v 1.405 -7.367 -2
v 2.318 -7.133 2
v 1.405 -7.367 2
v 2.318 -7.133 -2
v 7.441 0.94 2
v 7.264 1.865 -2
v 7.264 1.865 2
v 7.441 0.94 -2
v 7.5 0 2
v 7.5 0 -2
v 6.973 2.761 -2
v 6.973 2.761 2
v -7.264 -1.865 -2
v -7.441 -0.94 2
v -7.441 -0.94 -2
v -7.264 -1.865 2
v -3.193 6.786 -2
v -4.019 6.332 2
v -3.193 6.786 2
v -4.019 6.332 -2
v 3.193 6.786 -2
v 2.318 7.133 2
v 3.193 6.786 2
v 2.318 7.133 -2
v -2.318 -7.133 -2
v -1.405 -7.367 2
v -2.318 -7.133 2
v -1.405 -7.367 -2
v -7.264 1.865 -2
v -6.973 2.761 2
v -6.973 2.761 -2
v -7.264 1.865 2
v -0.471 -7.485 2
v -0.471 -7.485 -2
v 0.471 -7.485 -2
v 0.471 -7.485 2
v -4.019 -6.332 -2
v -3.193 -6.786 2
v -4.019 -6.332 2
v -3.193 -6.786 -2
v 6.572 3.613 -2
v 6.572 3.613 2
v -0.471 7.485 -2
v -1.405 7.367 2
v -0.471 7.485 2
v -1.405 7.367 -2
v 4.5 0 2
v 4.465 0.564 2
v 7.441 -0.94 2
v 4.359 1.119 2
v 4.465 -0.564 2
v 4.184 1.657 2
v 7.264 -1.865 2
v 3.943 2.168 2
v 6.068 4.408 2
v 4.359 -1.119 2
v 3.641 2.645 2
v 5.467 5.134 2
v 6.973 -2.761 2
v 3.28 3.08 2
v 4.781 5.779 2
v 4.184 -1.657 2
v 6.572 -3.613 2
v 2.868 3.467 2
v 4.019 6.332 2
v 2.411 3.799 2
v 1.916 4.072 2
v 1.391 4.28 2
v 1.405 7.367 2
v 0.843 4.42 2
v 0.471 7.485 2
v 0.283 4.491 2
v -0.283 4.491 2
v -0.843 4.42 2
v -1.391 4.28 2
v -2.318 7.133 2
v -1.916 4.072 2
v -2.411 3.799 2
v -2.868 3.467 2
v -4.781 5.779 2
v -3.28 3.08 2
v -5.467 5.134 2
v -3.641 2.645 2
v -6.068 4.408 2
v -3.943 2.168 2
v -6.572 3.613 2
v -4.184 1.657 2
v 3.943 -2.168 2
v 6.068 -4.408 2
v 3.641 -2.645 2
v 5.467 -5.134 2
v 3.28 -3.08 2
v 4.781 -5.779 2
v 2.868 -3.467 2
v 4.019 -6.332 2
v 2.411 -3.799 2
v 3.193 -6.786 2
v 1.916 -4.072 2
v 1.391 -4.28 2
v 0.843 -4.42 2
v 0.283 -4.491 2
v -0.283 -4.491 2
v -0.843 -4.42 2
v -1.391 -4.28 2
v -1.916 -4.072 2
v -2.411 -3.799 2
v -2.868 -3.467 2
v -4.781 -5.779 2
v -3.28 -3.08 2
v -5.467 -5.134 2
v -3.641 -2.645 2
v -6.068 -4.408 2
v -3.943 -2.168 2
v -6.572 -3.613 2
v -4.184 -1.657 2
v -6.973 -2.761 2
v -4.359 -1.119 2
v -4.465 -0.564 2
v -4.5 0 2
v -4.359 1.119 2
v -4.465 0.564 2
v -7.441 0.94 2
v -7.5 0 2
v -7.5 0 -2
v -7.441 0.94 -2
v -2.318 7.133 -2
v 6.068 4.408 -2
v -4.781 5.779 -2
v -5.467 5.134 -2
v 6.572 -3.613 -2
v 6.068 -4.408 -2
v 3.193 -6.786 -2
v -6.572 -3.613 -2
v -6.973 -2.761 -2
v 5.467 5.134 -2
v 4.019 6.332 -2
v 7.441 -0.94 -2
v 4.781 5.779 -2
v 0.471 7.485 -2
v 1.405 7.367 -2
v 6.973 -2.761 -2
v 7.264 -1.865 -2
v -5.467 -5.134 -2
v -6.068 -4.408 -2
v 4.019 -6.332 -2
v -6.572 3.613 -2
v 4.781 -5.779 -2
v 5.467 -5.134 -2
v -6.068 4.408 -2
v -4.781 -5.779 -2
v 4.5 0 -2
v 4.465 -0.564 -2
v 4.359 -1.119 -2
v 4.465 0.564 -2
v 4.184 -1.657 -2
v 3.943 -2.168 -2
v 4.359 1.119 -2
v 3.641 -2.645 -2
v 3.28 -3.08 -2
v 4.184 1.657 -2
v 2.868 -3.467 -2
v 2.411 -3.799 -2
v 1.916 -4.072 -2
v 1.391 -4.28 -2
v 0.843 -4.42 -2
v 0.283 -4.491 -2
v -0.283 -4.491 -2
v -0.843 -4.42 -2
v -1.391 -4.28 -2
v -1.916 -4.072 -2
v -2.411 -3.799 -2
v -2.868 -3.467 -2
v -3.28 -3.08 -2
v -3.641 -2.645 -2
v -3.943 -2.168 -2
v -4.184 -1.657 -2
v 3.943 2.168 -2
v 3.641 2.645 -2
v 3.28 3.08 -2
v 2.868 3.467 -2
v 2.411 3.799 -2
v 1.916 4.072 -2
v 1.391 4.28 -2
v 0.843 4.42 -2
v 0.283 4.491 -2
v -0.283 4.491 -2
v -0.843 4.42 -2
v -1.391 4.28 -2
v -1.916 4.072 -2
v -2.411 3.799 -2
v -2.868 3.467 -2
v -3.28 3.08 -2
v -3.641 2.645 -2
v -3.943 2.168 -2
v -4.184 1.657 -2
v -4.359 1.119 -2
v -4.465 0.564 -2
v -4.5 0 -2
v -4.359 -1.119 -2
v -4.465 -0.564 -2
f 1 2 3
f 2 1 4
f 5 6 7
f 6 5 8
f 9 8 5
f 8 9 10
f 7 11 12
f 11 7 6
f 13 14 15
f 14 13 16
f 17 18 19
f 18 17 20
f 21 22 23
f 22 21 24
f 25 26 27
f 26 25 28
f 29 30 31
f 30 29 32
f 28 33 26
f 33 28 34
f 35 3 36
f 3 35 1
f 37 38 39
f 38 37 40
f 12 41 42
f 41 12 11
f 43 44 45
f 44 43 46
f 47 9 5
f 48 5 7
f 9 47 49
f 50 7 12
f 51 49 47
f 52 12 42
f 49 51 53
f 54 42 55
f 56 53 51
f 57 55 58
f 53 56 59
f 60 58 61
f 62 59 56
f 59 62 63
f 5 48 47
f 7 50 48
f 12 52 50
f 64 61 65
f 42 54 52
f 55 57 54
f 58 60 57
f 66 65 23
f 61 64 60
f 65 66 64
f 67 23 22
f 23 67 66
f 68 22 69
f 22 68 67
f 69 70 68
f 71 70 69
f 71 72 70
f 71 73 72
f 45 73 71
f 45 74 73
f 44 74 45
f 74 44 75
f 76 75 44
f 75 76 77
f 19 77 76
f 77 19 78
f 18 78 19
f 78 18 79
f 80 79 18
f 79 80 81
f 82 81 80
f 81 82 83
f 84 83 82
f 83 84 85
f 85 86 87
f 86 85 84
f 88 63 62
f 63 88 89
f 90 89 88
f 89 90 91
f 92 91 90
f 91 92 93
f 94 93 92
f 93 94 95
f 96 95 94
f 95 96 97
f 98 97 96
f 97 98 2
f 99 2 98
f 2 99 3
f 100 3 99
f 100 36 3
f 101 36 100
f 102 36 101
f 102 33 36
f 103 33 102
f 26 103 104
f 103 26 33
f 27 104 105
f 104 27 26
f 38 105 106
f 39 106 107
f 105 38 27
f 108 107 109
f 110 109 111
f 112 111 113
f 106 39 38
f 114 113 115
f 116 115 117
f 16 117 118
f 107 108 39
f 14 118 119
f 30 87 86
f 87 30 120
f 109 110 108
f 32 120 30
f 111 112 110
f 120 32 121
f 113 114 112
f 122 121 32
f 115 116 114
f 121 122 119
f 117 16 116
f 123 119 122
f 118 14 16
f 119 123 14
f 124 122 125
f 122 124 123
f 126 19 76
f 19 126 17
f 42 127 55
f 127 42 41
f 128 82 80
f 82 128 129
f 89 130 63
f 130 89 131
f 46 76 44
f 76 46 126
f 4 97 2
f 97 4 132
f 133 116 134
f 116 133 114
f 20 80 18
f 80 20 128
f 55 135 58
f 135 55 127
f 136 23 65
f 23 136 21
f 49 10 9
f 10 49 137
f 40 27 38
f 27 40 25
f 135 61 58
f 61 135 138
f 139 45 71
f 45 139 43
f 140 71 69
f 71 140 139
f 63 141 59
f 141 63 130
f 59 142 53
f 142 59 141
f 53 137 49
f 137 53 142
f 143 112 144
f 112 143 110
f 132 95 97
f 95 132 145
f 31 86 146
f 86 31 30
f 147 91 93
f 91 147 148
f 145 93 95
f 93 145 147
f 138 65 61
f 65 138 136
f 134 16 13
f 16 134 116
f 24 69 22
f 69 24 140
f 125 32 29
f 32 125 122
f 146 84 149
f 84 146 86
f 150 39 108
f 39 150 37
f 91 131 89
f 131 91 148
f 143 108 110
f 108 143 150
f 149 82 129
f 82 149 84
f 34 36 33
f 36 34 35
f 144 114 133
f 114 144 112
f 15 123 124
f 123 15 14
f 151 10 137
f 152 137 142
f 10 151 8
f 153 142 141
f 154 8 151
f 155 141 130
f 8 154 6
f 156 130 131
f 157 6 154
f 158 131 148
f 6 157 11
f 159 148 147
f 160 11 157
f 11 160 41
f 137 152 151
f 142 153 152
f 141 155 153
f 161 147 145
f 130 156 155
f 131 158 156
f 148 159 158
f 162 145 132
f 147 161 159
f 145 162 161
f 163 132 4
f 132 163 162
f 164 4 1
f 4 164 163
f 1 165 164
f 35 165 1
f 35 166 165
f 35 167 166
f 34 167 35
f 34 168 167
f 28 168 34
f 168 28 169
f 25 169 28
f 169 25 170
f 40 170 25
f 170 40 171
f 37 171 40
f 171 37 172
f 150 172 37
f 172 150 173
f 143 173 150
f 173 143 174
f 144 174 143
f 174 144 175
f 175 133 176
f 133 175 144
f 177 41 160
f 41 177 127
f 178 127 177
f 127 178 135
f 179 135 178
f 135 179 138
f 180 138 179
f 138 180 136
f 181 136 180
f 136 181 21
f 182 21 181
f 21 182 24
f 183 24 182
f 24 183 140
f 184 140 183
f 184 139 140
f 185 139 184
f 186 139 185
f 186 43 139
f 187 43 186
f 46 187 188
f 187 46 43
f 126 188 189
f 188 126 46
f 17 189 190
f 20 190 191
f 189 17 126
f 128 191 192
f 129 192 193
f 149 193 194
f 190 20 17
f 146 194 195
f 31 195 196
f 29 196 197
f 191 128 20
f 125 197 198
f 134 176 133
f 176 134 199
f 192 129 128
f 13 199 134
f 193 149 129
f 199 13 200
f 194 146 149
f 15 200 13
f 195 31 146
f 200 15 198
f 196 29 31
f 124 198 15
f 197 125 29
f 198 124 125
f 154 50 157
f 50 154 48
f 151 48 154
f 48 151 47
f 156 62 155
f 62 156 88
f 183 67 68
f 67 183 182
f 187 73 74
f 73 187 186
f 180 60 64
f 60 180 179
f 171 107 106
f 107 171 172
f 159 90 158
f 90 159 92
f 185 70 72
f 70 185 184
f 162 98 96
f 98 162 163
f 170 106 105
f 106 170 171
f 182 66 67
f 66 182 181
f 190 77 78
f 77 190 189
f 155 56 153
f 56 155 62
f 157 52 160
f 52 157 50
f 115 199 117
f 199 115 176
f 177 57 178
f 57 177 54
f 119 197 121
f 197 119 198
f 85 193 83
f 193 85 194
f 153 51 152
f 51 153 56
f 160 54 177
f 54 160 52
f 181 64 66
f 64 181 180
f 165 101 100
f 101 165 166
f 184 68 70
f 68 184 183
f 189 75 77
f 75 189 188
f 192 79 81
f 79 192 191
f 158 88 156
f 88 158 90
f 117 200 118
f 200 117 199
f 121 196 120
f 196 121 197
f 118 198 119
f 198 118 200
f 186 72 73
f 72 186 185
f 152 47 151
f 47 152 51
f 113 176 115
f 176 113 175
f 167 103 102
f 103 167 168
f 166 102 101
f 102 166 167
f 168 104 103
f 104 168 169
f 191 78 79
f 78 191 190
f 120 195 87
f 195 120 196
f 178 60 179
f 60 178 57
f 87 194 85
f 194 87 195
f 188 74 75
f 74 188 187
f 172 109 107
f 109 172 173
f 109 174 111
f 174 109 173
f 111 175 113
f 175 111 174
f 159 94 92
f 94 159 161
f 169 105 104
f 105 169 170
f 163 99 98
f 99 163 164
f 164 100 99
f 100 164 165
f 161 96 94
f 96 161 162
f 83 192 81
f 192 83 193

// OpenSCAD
$fn = 50;


difference() {
	union() {
		translate(v = [0, 0, -2.0000000000]) {
			cylinder(h = 4, r = 7.5000000000);
		}
	}
	union() {
		translate(v = [0, 0, -100.0000000000]) {
			cylinder(h = 200, r = 4.5000000000);
		}
	}
}
